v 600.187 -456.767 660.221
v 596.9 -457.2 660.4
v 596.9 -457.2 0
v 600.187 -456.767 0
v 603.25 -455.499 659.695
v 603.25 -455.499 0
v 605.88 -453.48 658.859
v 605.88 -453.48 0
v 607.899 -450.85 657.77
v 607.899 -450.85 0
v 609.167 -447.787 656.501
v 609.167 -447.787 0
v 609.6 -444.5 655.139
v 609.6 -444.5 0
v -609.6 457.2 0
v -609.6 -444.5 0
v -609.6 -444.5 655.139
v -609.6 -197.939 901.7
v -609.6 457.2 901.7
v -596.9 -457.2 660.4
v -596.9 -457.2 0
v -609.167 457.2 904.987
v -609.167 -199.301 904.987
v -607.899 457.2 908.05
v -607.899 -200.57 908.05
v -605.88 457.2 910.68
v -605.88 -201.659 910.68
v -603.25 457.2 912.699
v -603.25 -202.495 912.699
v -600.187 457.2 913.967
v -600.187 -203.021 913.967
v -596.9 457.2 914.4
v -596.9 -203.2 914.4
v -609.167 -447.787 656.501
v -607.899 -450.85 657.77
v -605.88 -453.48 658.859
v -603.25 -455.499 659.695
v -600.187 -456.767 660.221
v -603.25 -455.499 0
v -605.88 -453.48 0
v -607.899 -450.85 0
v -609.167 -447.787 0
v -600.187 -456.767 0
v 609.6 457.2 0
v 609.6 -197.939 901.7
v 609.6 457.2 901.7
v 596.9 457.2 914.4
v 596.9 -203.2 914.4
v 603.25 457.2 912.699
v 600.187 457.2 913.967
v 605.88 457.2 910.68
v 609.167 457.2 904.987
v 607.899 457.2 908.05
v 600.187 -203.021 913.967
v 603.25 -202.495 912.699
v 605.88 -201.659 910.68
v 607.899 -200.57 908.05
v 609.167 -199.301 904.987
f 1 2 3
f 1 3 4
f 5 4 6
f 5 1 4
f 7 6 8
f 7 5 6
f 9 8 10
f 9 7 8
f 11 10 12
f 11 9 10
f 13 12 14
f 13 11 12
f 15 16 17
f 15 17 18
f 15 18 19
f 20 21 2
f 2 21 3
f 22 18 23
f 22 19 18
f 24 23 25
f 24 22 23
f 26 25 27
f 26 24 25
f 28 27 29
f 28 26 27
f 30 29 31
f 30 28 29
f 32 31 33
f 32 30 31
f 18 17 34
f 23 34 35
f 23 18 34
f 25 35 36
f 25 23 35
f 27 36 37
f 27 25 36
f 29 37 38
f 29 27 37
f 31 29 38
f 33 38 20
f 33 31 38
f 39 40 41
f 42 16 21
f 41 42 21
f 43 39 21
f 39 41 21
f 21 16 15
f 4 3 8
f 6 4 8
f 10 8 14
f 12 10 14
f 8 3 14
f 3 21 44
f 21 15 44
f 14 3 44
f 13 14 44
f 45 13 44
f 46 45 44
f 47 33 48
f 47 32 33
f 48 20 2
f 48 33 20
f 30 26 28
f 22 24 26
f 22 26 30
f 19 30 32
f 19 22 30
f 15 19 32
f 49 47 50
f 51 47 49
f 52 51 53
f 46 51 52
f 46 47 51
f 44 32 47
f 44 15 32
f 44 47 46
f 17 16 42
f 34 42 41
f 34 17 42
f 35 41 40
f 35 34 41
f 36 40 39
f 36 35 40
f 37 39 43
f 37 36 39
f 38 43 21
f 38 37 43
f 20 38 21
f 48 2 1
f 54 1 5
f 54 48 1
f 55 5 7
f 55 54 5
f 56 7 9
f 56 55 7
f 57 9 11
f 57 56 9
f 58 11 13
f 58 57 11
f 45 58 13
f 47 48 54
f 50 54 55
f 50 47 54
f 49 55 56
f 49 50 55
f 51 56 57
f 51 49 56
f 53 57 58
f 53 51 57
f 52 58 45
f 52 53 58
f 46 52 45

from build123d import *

# Parameters (mm, degrees)
F0_W     = 1219.2
F0_H     = 914.4
F1_DEPTH = 914.4
F2_SIZE  = 254
F3_R     = 12.7


with BuildPart() as f1:
    # F0 (on Top) → F1 (new body)
    with BuildSketch(Plane.XY):
        Rectangle(F0_W, F0_H)
    extrude(amount=F1_DEPTH)

    # F2
    f2_edges = [f1.edges().sort_by_distance(p)[0] for p in [
        (0, -457.2, 914.4),
    ]]
    chamfer(f2_edges, length=F2_SIZE)

    # F3
    f3_edges = [f1.edges().sort_by_distance(p)[0] for p in [
        (609.6, 127, 914.4),
        (609.6, -330.2, 787.4),
        (609.6, -457.2, 330.2),
        (-609.6, -457.2, 330.2),
        (-609.6, -330.2, 787.4),
        (-609.6, 127, 914.4),
    ]]
    fillet(f3_edges, radius=F3_R)


solid = f1.part
